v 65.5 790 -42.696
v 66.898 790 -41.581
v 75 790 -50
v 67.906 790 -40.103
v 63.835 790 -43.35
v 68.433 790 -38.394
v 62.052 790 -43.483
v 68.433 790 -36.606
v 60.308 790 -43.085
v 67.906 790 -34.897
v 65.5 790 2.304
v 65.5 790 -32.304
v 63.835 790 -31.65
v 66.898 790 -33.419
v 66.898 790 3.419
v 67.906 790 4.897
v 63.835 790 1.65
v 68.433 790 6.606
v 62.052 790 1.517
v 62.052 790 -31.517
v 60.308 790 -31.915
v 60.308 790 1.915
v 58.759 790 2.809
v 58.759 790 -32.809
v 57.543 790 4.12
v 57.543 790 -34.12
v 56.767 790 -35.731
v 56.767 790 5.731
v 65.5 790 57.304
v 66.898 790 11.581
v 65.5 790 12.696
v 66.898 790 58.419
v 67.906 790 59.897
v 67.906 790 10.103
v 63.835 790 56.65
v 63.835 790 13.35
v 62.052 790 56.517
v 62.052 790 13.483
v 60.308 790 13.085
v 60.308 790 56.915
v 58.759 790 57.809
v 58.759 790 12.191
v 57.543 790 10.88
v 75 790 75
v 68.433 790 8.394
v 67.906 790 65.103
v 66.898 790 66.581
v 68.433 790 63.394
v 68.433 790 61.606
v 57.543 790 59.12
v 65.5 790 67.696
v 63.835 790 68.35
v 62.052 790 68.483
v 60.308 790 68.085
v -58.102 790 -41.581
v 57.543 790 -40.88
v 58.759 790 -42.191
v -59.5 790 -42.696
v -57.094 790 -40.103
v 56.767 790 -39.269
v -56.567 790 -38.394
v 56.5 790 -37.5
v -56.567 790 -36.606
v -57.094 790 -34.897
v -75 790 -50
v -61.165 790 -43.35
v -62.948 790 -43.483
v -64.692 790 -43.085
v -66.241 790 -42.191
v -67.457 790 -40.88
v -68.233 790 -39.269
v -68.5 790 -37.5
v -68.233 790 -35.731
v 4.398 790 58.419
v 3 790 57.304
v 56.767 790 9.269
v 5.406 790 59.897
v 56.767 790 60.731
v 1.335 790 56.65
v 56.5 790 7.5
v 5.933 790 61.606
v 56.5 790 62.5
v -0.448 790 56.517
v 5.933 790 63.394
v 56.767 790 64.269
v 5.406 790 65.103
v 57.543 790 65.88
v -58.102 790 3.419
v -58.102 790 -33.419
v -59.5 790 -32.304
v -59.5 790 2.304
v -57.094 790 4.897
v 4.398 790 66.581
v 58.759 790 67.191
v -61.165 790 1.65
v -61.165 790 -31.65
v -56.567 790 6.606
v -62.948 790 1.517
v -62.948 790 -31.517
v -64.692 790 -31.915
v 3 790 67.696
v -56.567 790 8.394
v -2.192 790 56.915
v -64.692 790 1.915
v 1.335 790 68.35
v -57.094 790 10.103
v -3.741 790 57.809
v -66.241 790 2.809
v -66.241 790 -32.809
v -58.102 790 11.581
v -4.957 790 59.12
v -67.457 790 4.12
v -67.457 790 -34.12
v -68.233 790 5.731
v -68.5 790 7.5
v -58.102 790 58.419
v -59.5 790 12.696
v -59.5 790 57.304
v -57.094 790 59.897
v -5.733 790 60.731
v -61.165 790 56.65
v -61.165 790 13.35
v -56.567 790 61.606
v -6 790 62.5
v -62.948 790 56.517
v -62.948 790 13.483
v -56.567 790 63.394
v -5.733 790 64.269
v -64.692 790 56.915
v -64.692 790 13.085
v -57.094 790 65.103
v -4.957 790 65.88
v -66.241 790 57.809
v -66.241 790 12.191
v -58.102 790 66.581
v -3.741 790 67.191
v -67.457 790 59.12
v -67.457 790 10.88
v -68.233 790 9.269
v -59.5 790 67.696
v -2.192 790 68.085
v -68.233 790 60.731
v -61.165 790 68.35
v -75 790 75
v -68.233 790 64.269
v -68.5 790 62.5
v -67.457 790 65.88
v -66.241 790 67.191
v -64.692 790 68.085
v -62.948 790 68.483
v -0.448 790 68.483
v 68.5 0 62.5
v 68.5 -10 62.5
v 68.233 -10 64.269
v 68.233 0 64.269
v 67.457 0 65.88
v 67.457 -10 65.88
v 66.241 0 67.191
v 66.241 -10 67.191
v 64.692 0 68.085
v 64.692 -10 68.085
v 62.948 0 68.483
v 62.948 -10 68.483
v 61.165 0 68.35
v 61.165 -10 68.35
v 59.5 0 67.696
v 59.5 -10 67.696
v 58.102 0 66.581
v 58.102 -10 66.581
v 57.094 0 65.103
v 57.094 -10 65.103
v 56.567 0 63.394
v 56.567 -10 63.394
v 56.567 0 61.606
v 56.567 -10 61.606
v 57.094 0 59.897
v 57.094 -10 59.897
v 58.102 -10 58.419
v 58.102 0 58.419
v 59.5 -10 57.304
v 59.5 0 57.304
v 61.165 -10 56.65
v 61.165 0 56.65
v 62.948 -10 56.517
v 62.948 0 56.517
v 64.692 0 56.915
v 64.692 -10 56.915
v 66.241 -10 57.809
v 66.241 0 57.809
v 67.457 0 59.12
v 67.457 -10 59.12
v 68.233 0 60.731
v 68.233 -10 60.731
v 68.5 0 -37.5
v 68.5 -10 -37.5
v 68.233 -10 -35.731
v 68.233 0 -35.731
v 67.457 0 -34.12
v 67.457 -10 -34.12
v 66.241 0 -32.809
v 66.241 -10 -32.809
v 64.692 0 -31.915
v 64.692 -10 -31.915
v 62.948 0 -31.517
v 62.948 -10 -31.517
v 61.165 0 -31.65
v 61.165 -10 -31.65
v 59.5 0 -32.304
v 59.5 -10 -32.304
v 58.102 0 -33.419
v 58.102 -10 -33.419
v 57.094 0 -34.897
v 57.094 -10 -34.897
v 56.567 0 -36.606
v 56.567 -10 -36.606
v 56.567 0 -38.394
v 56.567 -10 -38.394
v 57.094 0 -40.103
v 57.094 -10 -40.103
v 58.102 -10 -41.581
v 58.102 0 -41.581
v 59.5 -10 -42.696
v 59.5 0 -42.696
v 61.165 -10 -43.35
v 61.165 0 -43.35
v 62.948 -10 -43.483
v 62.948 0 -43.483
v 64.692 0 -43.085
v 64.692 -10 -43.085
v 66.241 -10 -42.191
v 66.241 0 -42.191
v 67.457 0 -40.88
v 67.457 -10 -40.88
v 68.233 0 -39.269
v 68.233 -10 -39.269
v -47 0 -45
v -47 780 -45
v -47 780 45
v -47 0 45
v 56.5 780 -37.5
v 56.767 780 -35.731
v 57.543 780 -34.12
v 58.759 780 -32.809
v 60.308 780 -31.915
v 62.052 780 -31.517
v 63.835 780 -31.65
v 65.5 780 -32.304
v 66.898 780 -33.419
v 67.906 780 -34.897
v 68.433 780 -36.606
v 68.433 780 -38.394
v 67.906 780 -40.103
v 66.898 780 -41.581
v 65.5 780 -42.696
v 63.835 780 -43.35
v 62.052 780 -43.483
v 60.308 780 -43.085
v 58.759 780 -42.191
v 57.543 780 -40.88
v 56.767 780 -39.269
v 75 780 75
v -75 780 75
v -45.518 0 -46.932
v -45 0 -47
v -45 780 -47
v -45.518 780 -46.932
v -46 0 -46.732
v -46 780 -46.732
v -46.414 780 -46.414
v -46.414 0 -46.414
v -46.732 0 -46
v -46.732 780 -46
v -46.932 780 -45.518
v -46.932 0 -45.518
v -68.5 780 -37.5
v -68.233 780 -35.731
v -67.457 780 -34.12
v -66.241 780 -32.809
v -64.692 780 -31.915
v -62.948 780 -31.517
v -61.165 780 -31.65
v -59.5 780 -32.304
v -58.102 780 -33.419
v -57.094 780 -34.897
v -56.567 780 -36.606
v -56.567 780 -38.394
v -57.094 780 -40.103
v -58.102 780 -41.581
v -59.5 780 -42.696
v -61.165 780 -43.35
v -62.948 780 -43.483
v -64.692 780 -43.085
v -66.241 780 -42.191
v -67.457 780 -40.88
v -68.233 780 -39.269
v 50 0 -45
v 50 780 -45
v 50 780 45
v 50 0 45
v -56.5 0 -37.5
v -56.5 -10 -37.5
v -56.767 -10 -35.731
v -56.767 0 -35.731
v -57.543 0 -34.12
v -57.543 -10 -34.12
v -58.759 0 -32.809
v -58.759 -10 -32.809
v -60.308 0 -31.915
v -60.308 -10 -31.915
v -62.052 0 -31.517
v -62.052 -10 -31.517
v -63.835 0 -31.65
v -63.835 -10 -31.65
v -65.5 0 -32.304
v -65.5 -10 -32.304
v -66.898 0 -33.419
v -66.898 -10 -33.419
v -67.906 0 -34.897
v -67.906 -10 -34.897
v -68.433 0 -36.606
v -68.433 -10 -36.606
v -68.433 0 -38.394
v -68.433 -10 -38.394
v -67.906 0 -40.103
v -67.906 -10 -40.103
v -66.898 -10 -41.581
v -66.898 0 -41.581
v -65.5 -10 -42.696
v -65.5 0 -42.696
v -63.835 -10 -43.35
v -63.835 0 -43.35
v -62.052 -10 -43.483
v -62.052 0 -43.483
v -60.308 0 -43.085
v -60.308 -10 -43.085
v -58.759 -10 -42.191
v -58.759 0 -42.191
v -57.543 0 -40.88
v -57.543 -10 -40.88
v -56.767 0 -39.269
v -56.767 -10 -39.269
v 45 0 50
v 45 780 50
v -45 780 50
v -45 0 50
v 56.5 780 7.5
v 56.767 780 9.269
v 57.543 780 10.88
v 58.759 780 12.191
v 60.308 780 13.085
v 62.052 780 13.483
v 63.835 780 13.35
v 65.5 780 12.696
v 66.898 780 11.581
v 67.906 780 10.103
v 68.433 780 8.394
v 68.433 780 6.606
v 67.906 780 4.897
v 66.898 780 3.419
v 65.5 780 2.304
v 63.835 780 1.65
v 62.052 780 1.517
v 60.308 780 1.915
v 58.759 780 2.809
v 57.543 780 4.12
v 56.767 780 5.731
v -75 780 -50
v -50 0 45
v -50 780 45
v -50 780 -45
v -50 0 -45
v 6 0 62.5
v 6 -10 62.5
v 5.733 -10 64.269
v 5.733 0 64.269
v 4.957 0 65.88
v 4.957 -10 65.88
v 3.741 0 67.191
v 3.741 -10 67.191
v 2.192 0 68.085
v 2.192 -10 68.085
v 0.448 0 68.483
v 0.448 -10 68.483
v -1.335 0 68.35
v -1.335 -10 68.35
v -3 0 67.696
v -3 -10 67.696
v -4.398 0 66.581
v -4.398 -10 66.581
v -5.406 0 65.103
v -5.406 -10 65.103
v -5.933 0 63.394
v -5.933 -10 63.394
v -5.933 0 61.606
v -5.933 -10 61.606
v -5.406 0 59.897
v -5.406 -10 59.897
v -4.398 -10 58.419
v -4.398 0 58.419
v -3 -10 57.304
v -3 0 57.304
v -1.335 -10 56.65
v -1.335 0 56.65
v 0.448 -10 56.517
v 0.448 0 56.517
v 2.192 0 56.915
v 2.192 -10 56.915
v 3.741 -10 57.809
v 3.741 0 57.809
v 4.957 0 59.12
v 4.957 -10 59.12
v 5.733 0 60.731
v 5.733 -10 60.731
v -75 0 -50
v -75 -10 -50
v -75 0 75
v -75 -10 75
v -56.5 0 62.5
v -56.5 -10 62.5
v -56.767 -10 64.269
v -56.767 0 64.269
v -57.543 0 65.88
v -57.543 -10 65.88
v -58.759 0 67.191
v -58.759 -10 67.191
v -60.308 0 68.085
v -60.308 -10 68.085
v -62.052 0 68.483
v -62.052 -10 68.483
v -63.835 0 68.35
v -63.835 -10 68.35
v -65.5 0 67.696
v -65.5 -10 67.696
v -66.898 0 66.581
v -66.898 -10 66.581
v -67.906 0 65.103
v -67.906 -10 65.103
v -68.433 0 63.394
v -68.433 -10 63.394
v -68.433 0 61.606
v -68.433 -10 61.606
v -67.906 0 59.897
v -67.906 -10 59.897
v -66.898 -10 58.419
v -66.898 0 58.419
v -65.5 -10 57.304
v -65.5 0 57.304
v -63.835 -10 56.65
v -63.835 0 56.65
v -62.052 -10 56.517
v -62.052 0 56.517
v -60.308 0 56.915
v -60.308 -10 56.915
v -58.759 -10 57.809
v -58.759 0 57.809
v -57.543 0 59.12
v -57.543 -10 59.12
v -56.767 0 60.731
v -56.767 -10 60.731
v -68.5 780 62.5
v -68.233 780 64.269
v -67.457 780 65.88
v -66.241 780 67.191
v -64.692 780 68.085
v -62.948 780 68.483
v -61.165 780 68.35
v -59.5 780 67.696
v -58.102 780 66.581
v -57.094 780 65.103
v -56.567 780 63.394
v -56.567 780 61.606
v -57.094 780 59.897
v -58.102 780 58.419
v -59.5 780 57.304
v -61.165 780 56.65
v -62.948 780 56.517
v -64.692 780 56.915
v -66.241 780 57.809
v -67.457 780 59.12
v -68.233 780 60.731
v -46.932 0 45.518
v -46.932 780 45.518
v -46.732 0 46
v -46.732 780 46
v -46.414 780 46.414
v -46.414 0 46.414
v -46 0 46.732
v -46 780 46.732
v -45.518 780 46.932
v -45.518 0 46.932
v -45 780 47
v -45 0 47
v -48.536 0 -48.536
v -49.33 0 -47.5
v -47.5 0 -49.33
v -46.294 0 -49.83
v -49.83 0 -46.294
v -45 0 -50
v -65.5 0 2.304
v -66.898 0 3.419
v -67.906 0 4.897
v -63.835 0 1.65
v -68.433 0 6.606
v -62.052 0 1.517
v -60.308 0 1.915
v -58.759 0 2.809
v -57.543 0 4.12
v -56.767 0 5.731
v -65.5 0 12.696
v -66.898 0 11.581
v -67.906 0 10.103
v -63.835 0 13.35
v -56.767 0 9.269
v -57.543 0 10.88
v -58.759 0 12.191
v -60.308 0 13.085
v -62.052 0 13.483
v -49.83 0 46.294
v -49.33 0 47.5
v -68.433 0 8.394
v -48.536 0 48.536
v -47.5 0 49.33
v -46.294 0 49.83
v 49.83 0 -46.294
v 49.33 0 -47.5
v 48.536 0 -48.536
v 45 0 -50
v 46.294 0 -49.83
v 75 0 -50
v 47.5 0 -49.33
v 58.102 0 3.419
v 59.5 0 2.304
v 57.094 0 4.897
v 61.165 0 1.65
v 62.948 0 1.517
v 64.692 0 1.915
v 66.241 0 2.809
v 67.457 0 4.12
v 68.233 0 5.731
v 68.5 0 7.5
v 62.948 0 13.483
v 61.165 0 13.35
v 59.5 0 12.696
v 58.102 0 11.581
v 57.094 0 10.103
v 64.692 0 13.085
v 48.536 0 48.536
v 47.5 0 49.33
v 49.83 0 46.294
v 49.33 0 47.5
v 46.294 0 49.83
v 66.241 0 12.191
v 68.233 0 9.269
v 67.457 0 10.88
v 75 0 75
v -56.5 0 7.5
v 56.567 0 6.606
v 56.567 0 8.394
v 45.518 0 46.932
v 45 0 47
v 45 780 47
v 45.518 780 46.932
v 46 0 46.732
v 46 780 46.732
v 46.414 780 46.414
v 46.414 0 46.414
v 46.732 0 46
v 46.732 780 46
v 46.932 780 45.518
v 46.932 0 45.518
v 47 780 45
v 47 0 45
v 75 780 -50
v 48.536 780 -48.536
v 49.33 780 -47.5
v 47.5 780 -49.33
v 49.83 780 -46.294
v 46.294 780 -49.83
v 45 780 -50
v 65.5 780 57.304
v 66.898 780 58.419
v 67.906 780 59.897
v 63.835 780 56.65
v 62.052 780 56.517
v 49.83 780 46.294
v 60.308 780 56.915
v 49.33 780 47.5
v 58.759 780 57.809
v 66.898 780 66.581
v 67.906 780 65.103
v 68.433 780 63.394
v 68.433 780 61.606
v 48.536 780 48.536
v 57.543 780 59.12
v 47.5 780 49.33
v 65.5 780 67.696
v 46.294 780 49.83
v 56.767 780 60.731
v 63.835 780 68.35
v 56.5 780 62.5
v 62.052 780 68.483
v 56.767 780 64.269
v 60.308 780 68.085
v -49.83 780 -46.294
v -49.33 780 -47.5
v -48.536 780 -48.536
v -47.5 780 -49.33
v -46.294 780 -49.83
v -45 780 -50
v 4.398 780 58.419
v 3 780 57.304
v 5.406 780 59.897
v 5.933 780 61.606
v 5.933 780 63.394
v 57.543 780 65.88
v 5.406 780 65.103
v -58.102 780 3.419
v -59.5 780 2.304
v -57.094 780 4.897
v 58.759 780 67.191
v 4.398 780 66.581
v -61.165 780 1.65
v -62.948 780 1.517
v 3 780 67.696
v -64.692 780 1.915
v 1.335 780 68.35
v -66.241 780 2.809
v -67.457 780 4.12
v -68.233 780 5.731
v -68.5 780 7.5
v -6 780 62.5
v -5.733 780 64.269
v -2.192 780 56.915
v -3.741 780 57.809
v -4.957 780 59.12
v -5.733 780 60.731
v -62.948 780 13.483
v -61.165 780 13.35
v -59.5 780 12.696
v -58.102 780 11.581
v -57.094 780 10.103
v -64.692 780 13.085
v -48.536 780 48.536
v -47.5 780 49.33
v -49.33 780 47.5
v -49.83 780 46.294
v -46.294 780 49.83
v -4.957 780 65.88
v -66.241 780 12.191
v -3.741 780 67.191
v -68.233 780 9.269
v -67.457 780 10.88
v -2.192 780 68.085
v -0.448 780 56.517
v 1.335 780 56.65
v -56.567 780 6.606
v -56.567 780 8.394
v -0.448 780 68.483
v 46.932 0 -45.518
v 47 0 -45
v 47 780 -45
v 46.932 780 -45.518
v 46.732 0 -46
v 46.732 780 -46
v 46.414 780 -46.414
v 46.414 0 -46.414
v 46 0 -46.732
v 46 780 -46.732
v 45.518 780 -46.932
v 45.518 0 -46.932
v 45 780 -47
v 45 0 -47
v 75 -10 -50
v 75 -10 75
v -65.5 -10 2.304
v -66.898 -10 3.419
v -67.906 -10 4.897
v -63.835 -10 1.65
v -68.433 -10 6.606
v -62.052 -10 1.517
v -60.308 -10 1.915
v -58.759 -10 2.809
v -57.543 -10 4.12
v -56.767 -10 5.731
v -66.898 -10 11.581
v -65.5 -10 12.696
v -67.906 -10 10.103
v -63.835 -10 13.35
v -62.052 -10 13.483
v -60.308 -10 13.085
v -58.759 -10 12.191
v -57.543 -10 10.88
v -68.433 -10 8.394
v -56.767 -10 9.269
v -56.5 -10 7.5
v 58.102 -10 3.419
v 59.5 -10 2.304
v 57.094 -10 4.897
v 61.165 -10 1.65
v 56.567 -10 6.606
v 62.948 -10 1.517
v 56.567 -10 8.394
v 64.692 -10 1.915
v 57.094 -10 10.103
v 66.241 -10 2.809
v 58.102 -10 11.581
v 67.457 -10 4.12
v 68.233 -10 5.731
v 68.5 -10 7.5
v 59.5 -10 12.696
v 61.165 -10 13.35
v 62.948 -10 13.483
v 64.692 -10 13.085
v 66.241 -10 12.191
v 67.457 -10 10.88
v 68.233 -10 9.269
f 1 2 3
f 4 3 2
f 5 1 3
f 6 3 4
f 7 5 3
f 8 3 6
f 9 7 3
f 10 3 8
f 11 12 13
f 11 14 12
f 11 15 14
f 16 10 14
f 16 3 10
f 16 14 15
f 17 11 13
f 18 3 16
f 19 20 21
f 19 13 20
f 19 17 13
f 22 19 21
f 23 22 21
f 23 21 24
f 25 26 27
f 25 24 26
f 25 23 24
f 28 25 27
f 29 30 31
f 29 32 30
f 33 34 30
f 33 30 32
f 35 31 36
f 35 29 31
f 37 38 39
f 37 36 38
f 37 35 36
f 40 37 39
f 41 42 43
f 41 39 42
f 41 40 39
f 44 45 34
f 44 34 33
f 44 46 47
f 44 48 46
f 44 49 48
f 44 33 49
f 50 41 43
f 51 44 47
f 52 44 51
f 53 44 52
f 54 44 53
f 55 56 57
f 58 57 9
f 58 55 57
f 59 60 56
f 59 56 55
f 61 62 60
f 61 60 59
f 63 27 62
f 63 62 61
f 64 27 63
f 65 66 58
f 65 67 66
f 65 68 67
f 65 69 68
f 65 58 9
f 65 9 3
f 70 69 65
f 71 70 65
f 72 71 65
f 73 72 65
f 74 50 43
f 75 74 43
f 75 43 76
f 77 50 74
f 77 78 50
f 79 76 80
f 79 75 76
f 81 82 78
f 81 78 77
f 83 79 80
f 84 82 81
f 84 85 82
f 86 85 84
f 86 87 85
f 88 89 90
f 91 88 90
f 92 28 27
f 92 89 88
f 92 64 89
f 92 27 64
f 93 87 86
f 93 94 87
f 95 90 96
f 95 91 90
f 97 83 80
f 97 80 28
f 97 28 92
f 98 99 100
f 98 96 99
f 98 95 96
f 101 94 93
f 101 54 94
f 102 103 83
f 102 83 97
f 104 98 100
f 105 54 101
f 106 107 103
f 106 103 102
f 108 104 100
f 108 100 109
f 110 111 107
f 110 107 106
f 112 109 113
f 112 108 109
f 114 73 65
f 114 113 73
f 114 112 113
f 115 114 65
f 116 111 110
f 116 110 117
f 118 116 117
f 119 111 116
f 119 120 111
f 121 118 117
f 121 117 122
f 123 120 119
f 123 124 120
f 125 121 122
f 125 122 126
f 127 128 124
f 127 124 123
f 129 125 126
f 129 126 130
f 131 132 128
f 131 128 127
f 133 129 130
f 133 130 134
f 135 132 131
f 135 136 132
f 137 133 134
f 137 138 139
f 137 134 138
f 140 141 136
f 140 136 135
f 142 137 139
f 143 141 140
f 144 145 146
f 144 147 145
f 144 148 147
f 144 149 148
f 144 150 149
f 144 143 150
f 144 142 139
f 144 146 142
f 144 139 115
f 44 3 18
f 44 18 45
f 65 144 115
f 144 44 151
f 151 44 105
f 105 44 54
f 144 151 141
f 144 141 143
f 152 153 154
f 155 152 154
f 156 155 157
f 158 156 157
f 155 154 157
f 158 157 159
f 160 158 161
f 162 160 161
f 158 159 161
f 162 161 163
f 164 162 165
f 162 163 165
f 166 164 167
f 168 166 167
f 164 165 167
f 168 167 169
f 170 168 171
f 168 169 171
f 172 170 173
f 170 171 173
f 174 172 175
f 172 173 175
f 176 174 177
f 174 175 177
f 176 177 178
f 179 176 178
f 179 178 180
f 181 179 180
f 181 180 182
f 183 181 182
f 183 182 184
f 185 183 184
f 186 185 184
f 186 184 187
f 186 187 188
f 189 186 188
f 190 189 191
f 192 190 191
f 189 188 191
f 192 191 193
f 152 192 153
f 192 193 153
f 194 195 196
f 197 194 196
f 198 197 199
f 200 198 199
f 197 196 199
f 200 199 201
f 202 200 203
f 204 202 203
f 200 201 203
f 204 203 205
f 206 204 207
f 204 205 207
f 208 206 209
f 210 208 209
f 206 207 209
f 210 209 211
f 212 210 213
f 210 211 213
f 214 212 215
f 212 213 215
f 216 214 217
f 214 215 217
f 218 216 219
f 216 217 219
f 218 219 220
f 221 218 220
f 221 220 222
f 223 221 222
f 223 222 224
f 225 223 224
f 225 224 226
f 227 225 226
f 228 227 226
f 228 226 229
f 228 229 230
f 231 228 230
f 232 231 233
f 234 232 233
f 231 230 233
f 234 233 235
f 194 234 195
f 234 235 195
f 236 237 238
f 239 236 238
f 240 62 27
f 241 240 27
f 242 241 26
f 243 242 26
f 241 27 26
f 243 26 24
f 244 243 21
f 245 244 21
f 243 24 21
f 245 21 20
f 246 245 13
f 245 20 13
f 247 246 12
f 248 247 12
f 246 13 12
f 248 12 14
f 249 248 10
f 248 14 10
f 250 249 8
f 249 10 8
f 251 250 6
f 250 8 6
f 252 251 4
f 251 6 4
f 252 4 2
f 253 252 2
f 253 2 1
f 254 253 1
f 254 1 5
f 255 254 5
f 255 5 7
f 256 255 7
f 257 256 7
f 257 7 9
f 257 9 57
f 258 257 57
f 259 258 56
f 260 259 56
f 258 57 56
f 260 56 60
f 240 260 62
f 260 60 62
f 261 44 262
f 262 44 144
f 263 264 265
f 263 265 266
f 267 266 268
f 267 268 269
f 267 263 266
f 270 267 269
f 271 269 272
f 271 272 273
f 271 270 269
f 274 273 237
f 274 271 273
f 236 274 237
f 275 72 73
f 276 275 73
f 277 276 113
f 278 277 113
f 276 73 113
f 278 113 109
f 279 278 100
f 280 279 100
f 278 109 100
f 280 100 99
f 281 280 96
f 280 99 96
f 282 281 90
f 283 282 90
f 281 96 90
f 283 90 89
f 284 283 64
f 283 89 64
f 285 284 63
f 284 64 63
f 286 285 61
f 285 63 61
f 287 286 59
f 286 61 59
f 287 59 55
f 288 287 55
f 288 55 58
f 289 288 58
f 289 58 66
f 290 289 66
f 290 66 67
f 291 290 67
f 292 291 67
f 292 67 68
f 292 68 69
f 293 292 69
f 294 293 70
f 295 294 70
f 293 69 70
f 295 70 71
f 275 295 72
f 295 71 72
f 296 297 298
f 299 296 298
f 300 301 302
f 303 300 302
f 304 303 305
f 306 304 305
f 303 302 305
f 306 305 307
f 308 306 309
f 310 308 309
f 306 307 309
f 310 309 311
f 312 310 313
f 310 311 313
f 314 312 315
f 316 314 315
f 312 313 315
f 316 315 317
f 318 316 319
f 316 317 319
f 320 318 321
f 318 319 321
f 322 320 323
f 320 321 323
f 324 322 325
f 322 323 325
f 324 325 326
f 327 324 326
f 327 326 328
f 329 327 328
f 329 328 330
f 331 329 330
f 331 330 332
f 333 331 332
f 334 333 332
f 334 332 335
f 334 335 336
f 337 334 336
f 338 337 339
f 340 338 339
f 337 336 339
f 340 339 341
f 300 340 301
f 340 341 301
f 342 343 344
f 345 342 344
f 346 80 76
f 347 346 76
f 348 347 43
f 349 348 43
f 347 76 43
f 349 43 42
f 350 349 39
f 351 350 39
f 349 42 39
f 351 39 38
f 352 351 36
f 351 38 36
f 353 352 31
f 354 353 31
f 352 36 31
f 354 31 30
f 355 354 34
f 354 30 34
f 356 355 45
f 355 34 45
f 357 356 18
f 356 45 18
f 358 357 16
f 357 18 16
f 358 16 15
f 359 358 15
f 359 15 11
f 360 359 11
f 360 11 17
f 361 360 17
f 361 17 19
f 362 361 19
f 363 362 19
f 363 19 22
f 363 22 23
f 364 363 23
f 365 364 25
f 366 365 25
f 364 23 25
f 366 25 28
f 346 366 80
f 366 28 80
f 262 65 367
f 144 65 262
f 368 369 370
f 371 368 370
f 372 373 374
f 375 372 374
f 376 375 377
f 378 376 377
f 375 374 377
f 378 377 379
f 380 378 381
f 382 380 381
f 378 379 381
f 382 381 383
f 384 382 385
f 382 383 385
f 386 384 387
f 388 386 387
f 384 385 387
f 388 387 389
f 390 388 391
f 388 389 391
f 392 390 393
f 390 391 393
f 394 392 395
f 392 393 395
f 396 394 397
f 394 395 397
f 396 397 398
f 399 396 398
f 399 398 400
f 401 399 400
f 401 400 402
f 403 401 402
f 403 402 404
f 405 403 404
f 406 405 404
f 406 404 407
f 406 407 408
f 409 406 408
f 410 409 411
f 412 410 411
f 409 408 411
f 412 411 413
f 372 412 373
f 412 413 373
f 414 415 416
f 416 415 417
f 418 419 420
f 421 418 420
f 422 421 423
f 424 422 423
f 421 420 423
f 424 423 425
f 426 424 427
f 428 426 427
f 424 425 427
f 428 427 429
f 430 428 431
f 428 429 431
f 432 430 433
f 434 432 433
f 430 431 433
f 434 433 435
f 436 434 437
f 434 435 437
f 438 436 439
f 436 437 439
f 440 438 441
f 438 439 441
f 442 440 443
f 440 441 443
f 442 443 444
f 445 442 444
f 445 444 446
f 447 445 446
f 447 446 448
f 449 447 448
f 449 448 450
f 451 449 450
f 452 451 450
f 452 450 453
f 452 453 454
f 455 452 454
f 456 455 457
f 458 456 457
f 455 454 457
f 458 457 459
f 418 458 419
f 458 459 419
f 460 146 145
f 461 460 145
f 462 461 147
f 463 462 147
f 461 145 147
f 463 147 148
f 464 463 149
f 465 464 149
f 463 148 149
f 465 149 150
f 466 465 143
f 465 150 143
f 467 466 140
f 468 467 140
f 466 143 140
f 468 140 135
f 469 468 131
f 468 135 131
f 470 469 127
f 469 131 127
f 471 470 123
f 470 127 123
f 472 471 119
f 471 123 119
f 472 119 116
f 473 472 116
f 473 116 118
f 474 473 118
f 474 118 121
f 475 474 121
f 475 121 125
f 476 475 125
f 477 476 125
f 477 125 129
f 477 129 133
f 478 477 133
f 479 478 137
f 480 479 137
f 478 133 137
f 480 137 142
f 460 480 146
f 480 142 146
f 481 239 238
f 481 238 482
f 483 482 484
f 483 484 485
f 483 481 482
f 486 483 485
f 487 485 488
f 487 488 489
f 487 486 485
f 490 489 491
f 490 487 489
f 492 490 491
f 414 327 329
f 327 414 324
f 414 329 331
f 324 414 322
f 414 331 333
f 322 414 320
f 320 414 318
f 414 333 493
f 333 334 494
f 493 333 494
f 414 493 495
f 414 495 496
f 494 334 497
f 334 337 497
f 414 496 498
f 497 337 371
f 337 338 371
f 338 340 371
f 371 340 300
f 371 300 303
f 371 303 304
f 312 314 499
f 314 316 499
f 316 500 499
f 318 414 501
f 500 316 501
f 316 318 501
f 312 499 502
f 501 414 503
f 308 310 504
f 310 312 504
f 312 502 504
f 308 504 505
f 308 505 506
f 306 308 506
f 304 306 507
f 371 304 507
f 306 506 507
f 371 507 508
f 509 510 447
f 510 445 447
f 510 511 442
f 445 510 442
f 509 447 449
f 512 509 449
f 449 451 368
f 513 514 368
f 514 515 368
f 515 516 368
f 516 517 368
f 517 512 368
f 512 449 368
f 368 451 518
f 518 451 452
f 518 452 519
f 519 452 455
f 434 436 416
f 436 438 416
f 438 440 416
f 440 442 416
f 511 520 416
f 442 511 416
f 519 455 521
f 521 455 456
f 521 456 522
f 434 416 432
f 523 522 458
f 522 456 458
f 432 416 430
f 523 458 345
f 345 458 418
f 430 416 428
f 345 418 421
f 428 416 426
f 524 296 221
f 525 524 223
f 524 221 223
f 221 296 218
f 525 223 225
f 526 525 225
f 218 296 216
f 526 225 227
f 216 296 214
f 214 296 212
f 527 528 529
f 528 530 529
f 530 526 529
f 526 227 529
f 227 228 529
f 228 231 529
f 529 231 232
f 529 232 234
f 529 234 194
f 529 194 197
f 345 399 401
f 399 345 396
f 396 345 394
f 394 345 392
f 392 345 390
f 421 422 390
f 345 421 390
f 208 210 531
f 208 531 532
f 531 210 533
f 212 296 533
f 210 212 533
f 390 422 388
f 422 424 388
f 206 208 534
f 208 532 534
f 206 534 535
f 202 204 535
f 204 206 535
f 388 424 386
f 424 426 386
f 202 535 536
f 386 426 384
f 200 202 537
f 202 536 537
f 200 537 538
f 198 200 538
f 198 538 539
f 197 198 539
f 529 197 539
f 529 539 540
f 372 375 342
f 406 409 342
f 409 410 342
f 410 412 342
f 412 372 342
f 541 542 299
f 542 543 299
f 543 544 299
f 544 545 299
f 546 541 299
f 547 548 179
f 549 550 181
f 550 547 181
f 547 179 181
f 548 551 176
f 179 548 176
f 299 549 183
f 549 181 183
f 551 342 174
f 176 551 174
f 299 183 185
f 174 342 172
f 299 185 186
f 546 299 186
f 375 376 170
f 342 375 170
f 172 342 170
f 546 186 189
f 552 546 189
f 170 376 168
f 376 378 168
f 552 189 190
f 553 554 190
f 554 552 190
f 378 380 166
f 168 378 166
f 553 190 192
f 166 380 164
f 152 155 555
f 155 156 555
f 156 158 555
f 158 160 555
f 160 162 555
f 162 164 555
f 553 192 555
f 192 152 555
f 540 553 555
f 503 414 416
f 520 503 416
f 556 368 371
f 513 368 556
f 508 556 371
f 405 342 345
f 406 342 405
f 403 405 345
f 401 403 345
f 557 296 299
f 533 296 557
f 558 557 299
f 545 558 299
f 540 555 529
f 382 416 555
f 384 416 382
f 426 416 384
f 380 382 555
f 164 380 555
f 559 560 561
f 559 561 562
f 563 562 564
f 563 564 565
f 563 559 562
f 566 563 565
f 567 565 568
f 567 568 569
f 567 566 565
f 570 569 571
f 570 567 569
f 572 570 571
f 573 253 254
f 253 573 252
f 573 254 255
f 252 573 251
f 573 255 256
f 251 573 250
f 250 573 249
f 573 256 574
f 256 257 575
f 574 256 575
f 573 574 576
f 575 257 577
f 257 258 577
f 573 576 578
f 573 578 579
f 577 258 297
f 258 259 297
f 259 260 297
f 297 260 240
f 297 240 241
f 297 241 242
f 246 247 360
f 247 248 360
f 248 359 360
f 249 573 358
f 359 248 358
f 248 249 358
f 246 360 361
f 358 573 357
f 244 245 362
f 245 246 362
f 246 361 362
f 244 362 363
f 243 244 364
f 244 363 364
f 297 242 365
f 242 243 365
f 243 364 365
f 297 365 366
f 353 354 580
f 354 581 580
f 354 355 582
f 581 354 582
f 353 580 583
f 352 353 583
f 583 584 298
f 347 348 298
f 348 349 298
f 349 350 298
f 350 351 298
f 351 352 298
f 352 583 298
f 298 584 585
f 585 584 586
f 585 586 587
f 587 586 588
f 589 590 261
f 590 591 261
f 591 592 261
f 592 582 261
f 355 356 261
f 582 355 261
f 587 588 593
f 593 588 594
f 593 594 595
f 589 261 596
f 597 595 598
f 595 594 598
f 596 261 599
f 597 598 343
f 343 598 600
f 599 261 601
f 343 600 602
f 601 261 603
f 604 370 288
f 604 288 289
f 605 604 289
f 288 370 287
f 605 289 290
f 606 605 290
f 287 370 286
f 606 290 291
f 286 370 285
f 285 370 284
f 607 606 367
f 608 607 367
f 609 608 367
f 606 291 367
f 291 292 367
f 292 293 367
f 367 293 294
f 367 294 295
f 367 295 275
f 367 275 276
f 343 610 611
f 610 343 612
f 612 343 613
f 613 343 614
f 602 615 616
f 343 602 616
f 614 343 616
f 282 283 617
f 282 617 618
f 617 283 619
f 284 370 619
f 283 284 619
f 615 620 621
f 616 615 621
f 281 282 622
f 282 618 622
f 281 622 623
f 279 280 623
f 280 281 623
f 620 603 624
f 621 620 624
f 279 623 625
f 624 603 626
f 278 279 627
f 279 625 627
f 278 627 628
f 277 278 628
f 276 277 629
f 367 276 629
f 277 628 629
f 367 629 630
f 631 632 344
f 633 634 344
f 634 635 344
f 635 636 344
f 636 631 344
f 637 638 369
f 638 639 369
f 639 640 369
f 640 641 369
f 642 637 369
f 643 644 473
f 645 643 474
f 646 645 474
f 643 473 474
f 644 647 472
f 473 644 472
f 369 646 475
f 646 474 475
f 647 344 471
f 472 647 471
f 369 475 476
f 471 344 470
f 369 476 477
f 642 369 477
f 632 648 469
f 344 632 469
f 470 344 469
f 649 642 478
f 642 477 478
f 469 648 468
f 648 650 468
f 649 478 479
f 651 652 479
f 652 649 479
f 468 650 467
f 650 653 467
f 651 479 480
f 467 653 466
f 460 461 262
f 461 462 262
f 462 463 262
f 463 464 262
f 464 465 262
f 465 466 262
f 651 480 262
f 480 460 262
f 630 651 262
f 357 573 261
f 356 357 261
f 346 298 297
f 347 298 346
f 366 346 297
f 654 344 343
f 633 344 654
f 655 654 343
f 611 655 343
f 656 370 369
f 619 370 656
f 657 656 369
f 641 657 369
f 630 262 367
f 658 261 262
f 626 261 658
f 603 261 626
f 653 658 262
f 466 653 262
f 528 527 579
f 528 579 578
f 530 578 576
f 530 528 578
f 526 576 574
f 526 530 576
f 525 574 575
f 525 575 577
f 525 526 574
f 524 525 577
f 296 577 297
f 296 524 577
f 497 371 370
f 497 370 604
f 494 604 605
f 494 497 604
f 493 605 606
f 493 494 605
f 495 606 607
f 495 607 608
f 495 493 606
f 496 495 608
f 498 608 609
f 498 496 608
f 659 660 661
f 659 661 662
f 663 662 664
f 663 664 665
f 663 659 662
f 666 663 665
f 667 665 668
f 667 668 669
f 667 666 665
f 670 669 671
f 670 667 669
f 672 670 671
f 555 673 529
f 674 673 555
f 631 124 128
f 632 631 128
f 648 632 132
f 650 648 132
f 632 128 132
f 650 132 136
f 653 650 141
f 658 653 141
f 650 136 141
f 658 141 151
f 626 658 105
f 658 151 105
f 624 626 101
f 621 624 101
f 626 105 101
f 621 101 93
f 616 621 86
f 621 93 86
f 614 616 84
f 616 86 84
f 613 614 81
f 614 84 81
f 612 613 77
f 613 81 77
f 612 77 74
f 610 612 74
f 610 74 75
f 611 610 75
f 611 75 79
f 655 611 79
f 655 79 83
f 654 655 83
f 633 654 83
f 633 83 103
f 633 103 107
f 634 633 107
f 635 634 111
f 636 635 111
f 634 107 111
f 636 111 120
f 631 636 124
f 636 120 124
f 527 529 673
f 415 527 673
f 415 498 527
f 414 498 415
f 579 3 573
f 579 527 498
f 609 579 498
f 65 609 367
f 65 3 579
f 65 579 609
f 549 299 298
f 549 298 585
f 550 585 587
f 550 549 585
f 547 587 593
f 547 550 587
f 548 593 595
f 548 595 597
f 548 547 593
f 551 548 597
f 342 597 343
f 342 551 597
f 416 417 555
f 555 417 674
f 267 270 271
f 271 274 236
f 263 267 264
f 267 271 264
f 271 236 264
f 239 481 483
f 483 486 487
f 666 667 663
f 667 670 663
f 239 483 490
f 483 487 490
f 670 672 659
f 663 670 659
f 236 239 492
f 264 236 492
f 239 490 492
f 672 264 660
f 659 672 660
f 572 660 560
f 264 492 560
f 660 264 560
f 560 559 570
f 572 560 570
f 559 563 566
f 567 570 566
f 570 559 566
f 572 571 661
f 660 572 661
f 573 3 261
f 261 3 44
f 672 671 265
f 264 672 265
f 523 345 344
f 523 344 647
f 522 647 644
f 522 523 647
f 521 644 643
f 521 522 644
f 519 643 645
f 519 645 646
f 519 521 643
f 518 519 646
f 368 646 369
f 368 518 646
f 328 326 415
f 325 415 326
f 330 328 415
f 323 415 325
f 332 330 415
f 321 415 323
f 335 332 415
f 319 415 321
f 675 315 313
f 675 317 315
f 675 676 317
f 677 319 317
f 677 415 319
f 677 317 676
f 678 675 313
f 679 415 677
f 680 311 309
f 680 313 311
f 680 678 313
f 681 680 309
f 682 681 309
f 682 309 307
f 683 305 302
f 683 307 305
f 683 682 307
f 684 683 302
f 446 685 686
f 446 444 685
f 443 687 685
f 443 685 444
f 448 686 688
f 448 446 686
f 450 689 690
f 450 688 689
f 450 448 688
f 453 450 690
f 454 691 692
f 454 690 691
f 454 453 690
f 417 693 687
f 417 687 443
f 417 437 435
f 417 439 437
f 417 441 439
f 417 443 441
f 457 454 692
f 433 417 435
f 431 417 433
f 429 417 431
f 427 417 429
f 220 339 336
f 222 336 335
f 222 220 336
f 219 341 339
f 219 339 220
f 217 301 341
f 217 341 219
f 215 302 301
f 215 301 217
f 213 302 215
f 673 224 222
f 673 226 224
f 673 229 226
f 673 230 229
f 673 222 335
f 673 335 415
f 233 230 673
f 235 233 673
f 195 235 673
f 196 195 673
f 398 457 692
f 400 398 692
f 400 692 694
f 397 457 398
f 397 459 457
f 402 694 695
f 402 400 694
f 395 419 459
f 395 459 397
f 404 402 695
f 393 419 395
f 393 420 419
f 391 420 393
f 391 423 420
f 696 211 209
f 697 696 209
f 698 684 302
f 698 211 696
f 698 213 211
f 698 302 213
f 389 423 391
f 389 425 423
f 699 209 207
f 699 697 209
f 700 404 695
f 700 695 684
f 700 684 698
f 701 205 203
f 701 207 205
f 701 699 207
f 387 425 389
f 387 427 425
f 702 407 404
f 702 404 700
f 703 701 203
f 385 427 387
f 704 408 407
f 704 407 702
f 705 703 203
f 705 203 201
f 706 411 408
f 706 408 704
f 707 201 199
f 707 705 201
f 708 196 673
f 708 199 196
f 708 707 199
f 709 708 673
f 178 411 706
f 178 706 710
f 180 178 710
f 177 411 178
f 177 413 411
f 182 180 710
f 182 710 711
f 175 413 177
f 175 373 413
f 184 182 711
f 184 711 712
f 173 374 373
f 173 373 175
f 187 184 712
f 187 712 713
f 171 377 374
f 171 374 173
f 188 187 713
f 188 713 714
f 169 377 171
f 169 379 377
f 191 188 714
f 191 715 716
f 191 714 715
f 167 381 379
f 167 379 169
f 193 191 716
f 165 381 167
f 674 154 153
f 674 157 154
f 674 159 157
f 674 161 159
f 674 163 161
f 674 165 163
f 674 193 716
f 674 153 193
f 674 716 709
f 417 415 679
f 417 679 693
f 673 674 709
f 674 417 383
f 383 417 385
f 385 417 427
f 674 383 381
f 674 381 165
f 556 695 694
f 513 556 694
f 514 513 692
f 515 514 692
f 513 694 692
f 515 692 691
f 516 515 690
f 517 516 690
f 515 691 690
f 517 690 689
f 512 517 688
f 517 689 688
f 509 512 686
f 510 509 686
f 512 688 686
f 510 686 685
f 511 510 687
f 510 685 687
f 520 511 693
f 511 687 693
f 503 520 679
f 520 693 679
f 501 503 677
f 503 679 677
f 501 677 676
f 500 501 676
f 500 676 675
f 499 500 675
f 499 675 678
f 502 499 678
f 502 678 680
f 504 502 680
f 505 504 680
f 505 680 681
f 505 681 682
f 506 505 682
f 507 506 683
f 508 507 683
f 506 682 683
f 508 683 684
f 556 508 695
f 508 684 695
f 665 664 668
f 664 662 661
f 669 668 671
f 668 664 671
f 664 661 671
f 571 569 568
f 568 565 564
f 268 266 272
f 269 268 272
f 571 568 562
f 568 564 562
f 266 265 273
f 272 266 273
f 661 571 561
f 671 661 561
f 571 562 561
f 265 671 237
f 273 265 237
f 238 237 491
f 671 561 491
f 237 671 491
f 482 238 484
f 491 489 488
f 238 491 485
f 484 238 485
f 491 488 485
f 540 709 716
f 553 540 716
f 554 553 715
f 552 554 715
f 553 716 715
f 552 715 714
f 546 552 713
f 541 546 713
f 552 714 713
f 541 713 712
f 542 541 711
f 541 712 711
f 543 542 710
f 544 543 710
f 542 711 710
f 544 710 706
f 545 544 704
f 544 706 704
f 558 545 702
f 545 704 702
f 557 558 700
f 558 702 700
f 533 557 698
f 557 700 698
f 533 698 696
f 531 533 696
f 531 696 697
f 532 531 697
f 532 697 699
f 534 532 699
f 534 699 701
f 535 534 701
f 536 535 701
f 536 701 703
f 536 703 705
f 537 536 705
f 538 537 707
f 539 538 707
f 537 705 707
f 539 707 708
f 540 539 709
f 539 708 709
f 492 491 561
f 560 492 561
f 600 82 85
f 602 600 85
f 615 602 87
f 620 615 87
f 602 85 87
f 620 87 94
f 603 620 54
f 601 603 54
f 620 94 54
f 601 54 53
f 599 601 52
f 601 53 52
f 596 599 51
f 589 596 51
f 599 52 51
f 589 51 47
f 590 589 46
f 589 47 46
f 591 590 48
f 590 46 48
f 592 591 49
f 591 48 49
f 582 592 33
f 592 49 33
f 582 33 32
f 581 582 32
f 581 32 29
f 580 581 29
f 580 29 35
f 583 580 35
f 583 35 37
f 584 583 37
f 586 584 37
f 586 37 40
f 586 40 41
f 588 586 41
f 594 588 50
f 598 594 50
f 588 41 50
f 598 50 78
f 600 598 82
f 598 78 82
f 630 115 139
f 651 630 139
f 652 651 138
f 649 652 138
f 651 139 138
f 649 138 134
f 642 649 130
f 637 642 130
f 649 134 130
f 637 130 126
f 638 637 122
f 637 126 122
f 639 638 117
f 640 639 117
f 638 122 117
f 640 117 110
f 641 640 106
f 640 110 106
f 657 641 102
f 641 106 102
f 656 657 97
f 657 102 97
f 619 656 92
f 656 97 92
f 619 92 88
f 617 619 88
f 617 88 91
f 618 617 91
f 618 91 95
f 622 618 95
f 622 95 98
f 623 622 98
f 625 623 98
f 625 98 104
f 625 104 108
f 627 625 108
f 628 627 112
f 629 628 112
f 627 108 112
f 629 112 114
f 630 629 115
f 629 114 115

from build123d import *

# Parameters (mm, degrees)
F1_DEPTH = 780
F3_W     = 150
F3_H     = 125
F3_R     = 6
F4_DEPTH = 10
F7_W     = 150
F7_H     = 125
F7_R     = 6
F8_DEPTH = 10


with BuildPart() as f1:
    # F0 (on Front) → F1 (new body)
    with BuildSketch(Plane.XZ):
        with BuildLine():
            ThreePointArc((50, 45), (48.5355339059, 48.5355339059), (45, 50))
            Line((45, 50), (-45, 50))
            ThreePointArc((-45, 50), (-48.5355339059, 48.5355339059), (-50, 45))
            Line((-50, 45), (-50, -45))
            ThreePointArc((-50, -45), (-48.5355339059, -48.5355339059), (-45, -50))
            Line((-45, -50), (45, -50))
            ThreePointArc((45, -50), (48.5355339059, -48.5355339059), (50, -45))
            Line((50, -45), (50, 45))
        make_face()
        with BuildLine():
            ThreePointArc((-47, 45), (-46.4142135624, 46.4142135624), (-45, 47))
            Line((-45, 47), (45, 47))
            ThreePointArc((45, 47), (46.4142135624, 46.4142135624), (47, 45))
            Line((47, 45), (47, -45))
            ThreePointArc((47, -45), (46.4142135624, -46.4142135624), (45, -47))
            Line((45, -47), (-45, -47))
            ThreePointArc((-45, -47), (-46.4142135624, -46.4142135624), (-47, -45))
            Line((-47, -45), (-47, 45))
        make_face(mode=Mode.SUBTRACT)
    extrude(amount=-F1_DEPTH)


with BuildPart() as f4:
    # F3 (on offset) → F4 (new body)
    with BuildSketch(Plane.XZ.offset(10)):
        with Locations((0, 12.5)):
            Rectangle(F3_W, F3_H)
        with Locations((-62.5, -37.5)):
            Circle(F3_R, mode=Mode.SUBTRACT)
        with Locations((-62.5, 7.5)):
            Circle(F3_R, mode=Mode.SUBTRACT)
        with Locations((62.5, -37.5)):
            Circle(F3_R, mode=Mode.SUBTRACT)
        with Locations((62.5, 7.5)):
            Circle(F3_R, mode=Mode.SUBTRACT)
        with Locations((-62.5, 62.5)):
            Circle(F3_R, mode=Mode.SUBTRACT)
        with Locations((0, 62.5)):
            Circle(F3_R, mode=Mode.SUBTRACT)
        with Locations((62.5, 62.5)):
            Circle(F3_R, mode=Mode.SUBTRACT)
    extrude(amount=-F4_DEPTH)


with BuildPart() as f1_1:
    add(f1.part)

    # F5: union F4
    add(f4.part)

    # F7 (on offset) → F8 (join)
    with BuildSketch(Plane(origin=(0, 790, 0), x_dir=(-1, 0, 0), z_dir=(0, 1, 0))):
        with Locations((0, 12.5)):
            Rectangle(F7_W, F7_H)
        with Locations((-62.5, -37.5)):
            Circle(F7_R, mode=Mode.SUBTRACT)
        with Locations((-62.5, 7.5)):
            Circle(F7_R, mode=Mode.SUBTRACT)
        with Locations((62.5, -37.5)):
            Circle(F7_R, mode=Mode.SUBTRACT)
        with Locations((62.5, 7.5)):
            Circle(F7_R, mode=Mode.SUBTRACT)
        with Locations((-62.5, 62.5)):
            Circle(F7_R, mode=Mode.SUBTRACT)
        with Locations((0, 62.5)):
            Circle(F7_R, mode=Mode.SUBTRACT)
        with Locations((62.5, 62.5)):
            Circle(F7_R, mode=Mode.SUBTRACT)
    extrude(amount=-F8_DEPTH)


solid = f1_1.part
